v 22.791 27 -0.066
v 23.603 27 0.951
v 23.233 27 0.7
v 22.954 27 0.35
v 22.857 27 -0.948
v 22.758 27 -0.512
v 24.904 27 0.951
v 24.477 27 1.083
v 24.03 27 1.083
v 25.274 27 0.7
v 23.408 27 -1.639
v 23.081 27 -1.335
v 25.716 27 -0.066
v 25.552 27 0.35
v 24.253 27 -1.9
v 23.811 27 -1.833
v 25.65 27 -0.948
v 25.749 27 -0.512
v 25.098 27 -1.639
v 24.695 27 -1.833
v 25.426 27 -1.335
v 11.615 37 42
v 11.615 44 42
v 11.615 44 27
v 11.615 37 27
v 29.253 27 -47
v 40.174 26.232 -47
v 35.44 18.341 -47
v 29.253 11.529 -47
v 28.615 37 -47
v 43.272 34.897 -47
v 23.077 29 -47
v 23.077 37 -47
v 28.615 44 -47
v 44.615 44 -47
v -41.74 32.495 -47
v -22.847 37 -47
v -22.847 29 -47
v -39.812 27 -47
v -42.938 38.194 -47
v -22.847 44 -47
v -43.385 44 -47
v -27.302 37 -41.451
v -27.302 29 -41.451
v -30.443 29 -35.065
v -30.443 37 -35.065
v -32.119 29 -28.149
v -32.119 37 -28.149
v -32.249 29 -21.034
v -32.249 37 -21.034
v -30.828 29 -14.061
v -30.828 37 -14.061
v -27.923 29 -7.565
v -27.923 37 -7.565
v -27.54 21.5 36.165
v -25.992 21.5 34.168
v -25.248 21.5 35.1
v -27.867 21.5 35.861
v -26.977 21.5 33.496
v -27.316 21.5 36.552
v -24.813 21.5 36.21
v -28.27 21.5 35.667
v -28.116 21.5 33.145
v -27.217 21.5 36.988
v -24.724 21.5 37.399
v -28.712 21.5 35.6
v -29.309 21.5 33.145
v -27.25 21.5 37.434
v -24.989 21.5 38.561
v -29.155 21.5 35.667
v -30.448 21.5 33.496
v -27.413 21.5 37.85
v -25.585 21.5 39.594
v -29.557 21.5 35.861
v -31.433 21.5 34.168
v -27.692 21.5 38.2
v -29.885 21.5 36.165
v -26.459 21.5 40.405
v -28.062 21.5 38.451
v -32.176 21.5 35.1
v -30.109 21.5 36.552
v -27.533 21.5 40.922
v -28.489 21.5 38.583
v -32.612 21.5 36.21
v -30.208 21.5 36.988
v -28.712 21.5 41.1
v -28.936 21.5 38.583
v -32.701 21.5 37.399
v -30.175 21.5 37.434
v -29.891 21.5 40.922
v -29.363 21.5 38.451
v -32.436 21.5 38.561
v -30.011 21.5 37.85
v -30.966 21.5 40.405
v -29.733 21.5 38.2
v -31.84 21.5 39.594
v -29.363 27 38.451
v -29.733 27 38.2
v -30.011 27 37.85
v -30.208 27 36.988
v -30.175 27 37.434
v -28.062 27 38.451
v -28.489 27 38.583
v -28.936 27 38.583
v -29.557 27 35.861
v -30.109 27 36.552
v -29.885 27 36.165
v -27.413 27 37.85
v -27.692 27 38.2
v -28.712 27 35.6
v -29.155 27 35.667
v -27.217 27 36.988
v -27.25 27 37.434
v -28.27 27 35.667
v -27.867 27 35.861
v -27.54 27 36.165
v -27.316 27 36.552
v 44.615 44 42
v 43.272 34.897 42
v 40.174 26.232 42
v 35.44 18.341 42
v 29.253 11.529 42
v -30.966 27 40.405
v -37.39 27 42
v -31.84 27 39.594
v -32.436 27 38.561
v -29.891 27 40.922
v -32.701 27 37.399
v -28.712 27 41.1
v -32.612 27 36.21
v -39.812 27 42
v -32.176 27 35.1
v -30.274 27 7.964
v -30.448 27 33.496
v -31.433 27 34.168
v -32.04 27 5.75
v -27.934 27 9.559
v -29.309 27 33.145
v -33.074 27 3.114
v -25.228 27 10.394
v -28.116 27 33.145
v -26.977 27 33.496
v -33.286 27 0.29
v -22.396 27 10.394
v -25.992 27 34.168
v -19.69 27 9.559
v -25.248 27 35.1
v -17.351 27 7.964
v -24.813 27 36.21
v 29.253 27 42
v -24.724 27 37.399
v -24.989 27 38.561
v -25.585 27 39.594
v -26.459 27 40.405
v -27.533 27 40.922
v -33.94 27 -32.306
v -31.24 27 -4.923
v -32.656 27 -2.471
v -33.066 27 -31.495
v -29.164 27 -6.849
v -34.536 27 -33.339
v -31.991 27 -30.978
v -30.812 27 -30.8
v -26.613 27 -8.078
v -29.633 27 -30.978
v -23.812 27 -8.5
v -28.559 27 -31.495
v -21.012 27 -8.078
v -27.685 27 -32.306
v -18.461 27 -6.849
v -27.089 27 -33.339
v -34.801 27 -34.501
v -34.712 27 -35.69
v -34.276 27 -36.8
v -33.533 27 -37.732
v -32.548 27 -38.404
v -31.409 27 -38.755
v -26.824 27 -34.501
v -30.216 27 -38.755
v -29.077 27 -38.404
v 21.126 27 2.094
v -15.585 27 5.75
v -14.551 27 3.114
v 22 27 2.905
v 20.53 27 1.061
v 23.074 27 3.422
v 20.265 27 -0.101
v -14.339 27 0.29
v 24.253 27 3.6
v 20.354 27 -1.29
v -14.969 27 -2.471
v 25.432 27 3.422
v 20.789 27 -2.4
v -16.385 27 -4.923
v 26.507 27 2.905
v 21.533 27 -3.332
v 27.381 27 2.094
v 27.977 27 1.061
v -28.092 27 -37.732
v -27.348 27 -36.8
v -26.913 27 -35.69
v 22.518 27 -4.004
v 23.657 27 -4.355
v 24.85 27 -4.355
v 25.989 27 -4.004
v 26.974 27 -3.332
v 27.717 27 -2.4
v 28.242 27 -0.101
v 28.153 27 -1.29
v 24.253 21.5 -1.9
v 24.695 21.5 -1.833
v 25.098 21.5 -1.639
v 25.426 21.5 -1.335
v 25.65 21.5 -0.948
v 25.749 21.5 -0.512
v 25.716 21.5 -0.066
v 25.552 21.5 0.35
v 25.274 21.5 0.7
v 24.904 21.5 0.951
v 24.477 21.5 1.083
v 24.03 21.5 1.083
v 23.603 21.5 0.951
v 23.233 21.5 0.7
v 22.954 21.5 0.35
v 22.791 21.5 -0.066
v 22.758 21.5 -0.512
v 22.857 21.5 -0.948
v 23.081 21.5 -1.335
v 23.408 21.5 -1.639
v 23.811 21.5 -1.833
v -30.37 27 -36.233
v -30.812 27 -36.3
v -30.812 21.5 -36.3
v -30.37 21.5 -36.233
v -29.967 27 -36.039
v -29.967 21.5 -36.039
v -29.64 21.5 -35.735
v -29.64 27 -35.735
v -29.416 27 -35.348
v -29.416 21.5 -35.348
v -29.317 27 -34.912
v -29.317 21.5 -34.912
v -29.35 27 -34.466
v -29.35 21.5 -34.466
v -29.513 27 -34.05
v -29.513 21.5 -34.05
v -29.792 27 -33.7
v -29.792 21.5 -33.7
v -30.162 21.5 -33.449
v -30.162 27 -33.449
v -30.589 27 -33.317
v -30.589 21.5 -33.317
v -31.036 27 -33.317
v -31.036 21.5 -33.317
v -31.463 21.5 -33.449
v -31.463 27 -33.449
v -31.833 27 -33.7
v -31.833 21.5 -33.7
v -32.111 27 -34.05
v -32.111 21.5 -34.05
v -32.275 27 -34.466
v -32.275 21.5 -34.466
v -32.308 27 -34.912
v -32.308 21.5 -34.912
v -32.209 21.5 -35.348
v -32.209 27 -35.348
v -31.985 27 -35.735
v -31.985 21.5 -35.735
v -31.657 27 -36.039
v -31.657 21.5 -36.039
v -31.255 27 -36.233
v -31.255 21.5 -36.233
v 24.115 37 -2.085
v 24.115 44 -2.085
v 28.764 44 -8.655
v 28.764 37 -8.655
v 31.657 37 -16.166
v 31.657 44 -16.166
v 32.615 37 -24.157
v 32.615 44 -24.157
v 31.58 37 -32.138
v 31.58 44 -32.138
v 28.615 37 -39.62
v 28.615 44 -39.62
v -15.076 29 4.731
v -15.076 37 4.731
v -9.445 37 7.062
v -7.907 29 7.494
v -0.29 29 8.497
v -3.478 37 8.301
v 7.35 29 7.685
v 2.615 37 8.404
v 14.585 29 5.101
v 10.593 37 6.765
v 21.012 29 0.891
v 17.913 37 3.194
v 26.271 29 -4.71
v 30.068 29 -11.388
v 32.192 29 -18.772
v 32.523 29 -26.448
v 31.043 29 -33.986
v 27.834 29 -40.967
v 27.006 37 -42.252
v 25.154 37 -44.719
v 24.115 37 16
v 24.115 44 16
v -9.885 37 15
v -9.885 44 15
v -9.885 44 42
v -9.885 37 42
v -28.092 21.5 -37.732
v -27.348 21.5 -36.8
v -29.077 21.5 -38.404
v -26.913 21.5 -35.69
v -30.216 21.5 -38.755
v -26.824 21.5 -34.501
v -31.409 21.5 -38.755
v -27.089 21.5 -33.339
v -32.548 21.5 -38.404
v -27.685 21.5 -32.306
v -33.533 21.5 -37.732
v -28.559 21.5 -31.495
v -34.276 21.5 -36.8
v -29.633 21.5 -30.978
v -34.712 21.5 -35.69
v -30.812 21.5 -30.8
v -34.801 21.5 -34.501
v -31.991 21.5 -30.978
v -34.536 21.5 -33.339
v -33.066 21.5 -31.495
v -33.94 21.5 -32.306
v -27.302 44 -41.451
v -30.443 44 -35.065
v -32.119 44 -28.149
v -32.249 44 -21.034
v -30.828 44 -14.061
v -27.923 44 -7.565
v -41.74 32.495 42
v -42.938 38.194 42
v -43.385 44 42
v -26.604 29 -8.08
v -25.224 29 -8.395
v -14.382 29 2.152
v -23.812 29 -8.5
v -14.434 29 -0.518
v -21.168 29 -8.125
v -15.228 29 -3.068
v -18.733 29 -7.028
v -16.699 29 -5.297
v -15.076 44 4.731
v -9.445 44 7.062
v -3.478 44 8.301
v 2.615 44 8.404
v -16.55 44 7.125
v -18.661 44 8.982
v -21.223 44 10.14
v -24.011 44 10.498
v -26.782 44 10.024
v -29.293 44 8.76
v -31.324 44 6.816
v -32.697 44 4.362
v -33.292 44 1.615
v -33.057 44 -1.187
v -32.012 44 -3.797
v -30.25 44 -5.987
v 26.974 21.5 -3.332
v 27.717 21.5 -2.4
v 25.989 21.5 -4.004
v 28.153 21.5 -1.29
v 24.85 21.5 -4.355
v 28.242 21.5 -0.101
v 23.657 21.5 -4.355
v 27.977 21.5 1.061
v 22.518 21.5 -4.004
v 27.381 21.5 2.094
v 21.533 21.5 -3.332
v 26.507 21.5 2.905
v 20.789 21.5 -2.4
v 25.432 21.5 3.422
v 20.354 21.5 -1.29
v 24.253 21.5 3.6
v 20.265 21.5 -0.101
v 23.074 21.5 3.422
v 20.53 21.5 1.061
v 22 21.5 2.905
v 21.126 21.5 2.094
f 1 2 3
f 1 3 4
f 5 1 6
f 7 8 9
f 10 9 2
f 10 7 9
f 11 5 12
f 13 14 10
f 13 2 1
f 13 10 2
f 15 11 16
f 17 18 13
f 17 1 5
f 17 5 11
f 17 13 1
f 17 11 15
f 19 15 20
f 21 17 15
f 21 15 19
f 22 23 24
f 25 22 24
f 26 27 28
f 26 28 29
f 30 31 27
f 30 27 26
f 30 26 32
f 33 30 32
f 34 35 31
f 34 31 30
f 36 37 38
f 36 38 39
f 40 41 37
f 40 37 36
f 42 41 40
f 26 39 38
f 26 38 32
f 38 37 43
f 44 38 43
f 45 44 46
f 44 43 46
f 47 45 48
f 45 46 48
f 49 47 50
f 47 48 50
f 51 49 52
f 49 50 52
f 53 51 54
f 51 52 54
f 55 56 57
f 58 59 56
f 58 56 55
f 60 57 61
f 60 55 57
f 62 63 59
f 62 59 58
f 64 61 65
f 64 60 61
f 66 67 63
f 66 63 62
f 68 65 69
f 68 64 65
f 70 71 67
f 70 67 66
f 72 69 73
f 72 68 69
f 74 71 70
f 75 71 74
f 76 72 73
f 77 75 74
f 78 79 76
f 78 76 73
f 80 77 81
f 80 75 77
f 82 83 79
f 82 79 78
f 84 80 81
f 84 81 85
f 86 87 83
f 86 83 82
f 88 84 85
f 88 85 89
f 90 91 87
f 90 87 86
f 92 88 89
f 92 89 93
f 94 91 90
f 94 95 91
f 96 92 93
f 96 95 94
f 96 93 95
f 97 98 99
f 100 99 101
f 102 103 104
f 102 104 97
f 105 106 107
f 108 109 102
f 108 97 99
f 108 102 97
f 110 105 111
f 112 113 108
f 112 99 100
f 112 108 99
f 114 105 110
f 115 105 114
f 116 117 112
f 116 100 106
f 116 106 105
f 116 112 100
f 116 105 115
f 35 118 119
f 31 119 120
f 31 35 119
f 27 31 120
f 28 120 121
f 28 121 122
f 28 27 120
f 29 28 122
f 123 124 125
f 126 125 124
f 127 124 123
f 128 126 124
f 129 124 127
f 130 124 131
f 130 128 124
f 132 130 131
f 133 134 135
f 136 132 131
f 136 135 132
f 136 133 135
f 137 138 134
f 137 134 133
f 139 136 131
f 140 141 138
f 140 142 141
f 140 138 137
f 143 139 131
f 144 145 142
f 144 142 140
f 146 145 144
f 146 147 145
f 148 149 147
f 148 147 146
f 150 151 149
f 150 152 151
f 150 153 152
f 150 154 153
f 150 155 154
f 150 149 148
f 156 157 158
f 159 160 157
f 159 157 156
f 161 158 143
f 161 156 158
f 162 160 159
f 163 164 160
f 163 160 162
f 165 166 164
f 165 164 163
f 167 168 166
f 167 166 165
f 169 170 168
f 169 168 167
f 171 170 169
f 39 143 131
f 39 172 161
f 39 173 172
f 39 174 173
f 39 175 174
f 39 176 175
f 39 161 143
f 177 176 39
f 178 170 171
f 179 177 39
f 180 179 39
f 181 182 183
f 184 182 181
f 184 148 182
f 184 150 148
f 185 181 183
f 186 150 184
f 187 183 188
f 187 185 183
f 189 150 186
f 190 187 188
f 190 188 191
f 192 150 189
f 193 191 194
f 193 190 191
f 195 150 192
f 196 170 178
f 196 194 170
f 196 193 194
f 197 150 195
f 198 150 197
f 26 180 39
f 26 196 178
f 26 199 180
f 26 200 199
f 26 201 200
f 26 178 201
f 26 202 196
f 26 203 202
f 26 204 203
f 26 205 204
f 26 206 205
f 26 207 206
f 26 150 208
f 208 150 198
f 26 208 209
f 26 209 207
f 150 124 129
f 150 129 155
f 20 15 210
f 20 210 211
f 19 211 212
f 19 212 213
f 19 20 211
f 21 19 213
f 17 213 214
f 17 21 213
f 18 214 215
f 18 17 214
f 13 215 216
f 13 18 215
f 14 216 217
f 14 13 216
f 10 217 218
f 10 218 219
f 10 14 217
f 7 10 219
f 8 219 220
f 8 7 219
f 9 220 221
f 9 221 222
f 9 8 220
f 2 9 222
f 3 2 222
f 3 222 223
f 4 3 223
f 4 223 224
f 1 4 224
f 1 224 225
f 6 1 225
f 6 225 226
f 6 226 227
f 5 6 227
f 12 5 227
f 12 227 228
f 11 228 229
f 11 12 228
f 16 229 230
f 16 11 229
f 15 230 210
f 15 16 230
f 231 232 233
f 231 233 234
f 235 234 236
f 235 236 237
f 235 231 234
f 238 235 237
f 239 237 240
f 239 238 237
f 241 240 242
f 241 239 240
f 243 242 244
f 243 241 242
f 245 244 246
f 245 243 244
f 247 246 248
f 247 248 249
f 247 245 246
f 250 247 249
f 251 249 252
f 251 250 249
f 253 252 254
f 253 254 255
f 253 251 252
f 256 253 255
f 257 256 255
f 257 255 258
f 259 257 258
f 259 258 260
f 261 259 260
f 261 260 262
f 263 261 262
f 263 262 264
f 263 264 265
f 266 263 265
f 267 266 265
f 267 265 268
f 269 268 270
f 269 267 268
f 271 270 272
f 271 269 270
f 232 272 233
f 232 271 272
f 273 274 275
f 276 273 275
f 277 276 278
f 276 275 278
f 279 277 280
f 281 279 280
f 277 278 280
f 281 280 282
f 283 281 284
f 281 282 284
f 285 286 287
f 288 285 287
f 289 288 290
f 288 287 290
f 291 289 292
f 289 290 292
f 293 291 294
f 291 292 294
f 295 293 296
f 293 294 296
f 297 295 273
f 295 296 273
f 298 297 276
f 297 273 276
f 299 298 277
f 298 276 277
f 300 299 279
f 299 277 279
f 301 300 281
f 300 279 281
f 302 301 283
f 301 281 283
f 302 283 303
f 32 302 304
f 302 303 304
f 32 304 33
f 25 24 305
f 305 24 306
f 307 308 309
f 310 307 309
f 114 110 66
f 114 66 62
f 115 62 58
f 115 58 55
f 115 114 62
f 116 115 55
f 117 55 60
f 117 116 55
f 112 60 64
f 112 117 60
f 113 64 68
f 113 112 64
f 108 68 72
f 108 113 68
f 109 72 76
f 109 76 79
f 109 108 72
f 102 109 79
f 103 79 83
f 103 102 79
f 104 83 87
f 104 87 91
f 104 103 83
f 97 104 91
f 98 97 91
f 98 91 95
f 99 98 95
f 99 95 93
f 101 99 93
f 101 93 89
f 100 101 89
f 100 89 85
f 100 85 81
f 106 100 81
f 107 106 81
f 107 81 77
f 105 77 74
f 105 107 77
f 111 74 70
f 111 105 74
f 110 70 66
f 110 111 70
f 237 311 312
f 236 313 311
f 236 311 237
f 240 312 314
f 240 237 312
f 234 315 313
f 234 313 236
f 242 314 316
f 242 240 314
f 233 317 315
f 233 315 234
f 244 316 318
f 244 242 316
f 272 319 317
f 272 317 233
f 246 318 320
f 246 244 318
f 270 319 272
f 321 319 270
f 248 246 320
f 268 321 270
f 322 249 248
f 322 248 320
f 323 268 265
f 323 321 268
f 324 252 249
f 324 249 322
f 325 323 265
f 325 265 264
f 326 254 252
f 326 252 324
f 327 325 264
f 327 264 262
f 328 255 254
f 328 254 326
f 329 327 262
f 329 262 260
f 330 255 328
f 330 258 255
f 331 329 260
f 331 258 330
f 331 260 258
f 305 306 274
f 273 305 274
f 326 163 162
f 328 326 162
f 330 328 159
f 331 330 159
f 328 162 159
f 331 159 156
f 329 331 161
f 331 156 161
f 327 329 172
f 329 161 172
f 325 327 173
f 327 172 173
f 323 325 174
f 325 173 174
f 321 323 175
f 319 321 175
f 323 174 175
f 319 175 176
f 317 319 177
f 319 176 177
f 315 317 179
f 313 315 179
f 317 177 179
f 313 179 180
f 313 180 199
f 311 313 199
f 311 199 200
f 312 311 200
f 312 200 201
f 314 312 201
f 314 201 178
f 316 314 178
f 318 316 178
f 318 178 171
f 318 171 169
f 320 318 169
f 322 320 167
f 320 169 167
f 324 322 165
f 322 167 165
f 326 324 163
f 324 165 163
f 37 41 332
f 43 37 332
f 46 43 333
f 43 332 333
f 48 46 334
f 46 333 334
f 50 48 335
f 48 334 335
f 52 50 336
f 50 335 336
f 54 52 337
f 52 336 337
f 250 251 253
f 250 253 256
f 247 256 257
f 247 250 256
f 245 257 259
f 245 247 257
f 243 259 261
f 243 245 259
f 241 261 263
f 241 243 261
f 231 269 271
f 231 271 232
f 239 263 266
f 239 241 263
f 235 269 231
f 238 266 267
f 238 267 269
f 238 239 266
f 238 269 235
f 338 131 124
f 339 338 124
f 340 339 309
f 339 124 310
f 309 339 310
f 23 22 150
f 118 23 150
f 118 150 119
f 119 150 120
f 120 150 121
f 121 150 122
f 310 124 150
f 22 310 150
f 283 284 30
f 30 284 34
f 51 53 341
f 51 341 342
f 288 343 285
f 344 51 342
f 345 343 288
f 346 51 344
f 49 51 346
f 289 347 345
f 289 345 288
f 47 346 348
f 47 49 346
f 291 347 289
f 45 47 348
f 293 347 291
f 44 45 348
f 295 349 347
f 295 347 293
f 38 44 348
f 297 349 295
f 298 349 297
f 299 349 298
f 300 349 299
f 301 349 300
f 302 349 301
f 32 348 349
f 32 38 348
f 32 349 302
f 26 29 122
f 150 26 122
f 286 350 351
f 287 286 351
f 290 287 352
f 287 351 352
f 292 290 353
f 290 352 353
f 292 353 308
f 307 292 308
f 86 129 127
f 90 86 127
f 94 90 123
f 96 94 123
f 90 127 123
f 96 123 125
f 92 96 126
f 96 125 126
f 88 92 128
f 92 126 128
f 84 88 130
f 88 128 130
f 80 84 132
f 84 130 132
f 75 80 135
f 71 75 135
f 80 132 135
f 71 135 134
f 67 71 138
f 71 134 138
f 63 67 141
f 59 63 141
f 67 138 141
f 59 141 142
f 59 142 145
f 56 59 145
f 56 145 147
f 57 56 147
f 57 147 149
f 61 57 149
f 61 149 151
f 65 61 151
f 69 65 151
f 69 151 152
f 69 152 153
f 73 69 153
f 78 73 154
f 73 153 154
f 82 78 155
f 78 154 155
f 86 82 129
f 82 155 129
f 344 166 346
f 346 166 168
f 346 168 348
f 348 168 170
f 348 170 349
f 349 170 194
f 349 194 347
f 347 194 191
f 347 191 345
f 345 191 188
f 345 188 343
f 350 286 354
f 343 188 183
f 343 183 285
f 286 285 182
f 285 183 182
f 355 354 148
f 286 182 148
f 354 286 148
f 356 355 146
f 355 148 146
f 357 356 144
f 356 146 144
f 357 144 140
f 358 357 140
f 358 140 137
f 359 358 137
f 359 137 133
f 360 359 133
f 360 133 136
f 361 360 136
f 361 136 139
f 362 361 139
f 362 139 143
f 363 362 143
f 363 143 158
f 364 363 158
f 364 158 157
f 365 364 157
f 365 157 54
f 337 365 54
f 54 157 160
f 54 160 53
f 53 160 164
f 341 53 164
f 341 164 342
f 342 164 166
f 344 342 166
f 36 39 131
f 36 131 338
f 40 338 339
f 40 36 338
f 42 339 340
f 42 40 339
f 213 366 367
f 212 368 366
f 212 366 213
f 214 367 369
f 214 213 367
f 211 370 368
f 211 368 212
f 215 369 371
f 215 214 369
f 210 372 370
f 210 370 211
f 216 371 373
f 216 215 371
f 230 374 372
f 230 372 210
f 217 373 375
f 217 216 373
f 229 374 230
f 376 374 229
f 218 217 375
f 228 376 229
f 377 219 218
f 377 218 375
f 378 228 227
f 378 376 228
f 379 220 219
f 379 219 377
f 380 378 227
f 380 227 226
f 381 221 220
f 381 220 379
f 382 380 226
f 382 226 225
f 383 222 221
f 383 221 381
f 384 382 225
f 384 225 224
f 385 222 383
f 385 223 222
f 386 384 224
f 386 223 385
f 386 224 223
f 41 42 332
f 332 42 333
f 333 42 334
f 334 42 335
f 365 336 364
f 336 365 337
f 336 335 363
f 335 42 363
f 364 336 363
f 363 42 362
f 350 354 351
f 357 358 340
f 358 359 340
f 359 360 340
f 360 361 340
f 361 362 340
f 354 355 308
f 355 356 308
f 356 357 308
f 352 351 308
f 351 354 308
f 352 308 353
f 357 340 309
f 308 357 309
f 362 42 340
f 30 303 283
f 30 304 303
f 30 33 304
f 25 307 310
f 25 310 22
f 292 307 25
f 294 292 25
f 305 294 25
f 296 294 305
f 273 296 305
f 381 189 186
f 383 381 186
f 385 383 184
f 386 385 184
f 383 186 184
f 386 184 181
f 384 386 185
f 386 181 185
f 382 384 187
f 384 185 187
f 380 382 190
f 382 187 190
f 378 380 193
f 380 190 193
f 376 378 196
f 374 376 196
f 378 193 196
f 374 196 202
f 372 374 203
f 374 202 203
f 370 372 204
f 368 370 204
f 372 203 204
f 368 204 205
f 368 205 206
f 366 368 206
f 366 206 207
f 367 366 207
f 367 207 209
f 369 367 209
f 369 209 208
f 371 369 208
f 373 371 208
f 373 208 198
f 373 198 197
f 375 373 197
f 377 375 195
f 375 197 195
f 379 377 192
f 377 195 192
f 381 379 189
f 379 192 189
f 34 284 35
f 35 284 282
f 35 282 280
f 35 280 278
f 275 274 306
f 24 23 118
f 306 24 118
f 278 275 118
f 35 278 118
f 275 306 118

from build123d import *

# Parameters (mm, degrees)
SKETCH1_W           = 87.952115464
SKETCH1_H           = 84
BOSS_EXTRUDE1_DEPTH = 44
CUT_EXTRUDE1_DEPTH  = 105.526999639
CUT_EXTRUDE2_DEPTH  = 94
BOSS_EXTRUDE2_DEPTH = 5
CUT_EXTRUDE4_DEPTH  = 108.023520294
BOSS_EXTRUDE3_DEPTH = 89
SKETCH12_W          = 66.643398472
SKETCH12_H          = 89
CUT_EXTRUDE5_DEPTH  = 21
SKETCH13_W          = 89
SKETCH13_H          = 4.850314153
CUT_EXTRUDE6_DEPTH  = 15
SKETCH14_R          = 9.5
CUT_EXTRUDE7_DEPTH  = 67.996371003
SKETCH15_R          = 4
SKETCH15_R_2        = 1.5
BOSS_EXTRUDE4_DEPTH = 5.5
CUT_EXTRUDE8_DEPTH  = 7
SKETCH17_R          = 32.5
CUT_EXTRUDE9_DEPTH  = 8


with BuildPart() as part:
    # Sketch1 → Boss-Extrude1 (new body)
    with BuildSketch(Plane(origin=(0, 0, 0), x_dir=(1, 0, 0), z_dir=(0, 1, 0))):
        Rectangle(SKETCH1_W, SKETCH1_H)
    extrude(amount=BOSS_EXTRUDE1_DEPTH)

    # Sketch3 → Cut-Extrude1 (cut, through all)
    with BuildSketch(Plane.XY.offset(42)):
        with BuildLine():
            Line((-21, 0), (21, 0))
            ThreePointArc((21, 0), (36.980443324, 19.654136956), (43.976057732, 44))
            Line((43.976057732, 44), (43.976057732, -11.97124173))
            Line((43.976057732, -11.97124173), (-43.976057732, -11.97124173))
            Line((-43.976057732, -11.97124173), (-43.976057732, 44))
            ThreePointArc((-43.976057732, 44), (-36.29063042, 20.014345617), (-21, 0))
        make_face()
    extrude(amount=-CUT_EXTRUDE1_DEPTH, mode=Mode.SUBTRACT)

    # Sketch4 → Cut-Extrude2 (cut)
    with BuildSketch(Plane.XY.offset(42)):
        with BuildLine():
            Line((-40.014597283, 44.55392338), (-43.976057732, 44))
            ThreePointArc((-43.976057732, 44), (-36.29063042, 20.014345617), (-21, 0))
            Line((-21, 0), (21, 0))
            ThreePointArc((21, 0), (36.980443324, 19.654136956), (43.976057732, 44))
            Line((43.976057732, 44), (39.988336247, 44.313173055))
            ThreePointArc((39.988336247, 44.313173055), (33.757294054, 22.132372023), (19.543536422, 4))
            Line((19.543536422, 4), (-19.406576645, 4))
            ThreePointArc((-19.406576645, 4), (-33.099796329, 22.554689448), (-40.014597283, 44.55392338))
        make_face()
    extrude(amount=-CUT_EXTRUDE2_DEPTH, mode=Mode.SUBTRACT)

    # Sketch6 → Boss-Extrude2 (add)
    with BuildSketch(Plane(origin=(0, 0, -42), x_dir=(-1, 0, 0), z_dir=(0, 0, -1))):
        with BuildLine():
            Line((-19.543536422, 4), (19.406576645, 4))
            ThreePointArc((19.406576645, 4), (32.972533813, 22.305488816), (39.934882496, 44))
            Line((39.934882496, 44), (-39.962906501, 44))
            ThreePointArc((-39.962906501, 44), (-33.686050128, 21.9923529), (-19.543536422, 4))
        make_face()
    extrude(amount=BOSS_EXTRUDE2_DEPTH)

    # Sketch8 → Cut-Extrude4 (cut, through all)
    with BuildSketch(Plane(origin=(0, 0, -47), x_dir=(-1, 0, 0), z_dir=(0, 0, -1))):
        with BuildLine():
            Line((-19.543536422, 4), (19.406576645, 4))
            ThreePointArc((19.406576645, 4), (20.408380664, 4.990013681), (21.390045584, 6))
            Line((21.390045584, 6), (-21.753352888, 6))
            ThreePointArc((-21.753352888, 6), (-20.661010919, 4.986115432), (-19.543536422, 4))
        make_face()
    extrude(amount=-CUT_EXTRUDE4_DEPTH, mode=Mode.SUBTRACT)

    # Sketch11 → Boss-Extrude3 (add)
    with BuildSketch(Plane(origin=(0, 0, -47), x_dir=(-1, 0, 0), z_dir=(0, 0, -1))):
        with BuildLine():
            Line((-21.753352888, 6), (21.390045584, 6))
            ThreePointArc((21.390045584, 6), (37.370443433, 22.115785334), (43.384826263, 44))
            Line((43.384826263, 44), (-44.615173737, 44))
            ThreePointArc((-44.615173737, 44), (-37.97109171, 22.12011544), (-21.753352888, 6))
        make_face()
    extrude(amount=-BOSS_EXTRUDE3_DEPTH)

    # Sketch12 → Cut-Extrude5 (cut)
    with BuildSketch(Plane.XZ.offset(-6)):
        with Locations((-4.068346348, -2.5)):
            Rectangle(SKETCH12_W, SKETCH12_H)
    extrude(amount=-CUT_EXTRUDE5_DEPTH, mode=Mode.SUBTRACT)

    # Sketch13 → Cut-Extrude6 (cut)
    with BuildSketch(Plane(origin=(-37.390045584, 0, 0), x_dir=(0, 0, -1), z_dir=(1, 0, 0))):
        with Locations((2.5, 24.574842924)):
            Rectangle(SKETCH13_W, SKETCH13_H)
    extrude(amount=-CUT_EXTRUDE6_DEPTH, mode=Mode.SUBTRACT)

    # Sketch14 → Cut-Extrude7 (cut, through all)
    with BuildSketch(Plane.XZ.offset(-27)):
        with Locations(Location((-23.812368574, 1, 0), (0, 0, 270))):
            Circle(SKETCH14_R)
    extrude(amount=-CUT_EXTRUDE7_DEPTH, mode=Mode.SUBTRACT)

    # Sketch15 → Boss-Extrude4 (add)
    # profile 1 of 3: a face of its own
    with BuildSketch(Plane.XZ.offset(-27)):
        with Locations(Location((-28.712368574, 37.1, 0), (0, 0, 90))):
            Circle(SKETCH15_R)
        with Locations(Location((-28.712368574, 37.1, 0), (0, 0, 270))):
            Circle(SKETCH15_R_2, mode=Mode.SUBTRACT)
    # profile 2 of 3: a face of its own
    with BuildSketch(Plane.XZ.offset(-27)):
        with Locations(Location((24.253352888, -0.4, 0), (0, 0, 90))):
            Circle(SKETCH15_R)
        with Locations(Location((24.253352888, -0.4, 0), (0, 0, 270))):
            Circle(SKETCH15_R_2, mode=Mode.SUBTRACT)
    # profile 3 of 3: a face of its own
    with BuildSketch(Plane.XZ.offset(-27)):
        with Locations(Location((-30.812368574, -34.8, 0), (0, 0, 90))):
            Circle(SKETCH15_R)
        with Locations(Location((-30.812368574, -34.8, 0), (0, 0, 270))):
            Circle(SKETCH15_R_2, mode=Mode.SUBTRACT)
    extrude(amount=BOSS_EXTRUDE4_DEPTH)

    # Sketch16 → Cut-Extrude8 (cut)
    with BuildSketch(Plane(origin=(0, 44, 0), x_dir=(1, 0, 0), z_dir=(0, 1, 0))):
        with BuildLine():
            Line((-9.884826263, -42), (11.615173737, -42))
            Line((11.615173737, -42), (11.615173737, -27))
            Line((11.615173737, -27), (24.115173737, -16))
            Line((24.115173737, -16), (24.115173737, 2.085392999))
            ThreePointArc((24.115173737, 2.085392999), (32.384099226, 20.131350652), (28.615173737, 39.620499352))
            Line((28.615173737, 39.620499352), (28.615173737, 47))
            Line((28.615173737, 47), (23.077098744, 47))
            ThreePointArc((23.077098744, 47), (-30.372036637, 35.259662676), (2.615173737, -8.403703492))
            Line((2.615173737, -8.403703492), (-9.884826263, -15))
            Line((-9.884826263, -15), (-9.884826263, -42))
        make_face()
    extrude(amount=-CUT_EXTRUDE8_DEPTH, mode=Mode.SUBTRACT)

    # Sketch17 → Cut-Extrude9 (cut)
    with BuildSketch(Plane(origin=(0, 37, 0), x_dir=(1, 0, 0), z_dir=(0, 1, 0))):
        with Locations((0.115173737, 24)):
            Circle(SKETCH17_R)
    extrude(amount=-CUT_EXTRUDE9_DEPTH, mode=Mode.SUBTRACT)


solid = part.part
